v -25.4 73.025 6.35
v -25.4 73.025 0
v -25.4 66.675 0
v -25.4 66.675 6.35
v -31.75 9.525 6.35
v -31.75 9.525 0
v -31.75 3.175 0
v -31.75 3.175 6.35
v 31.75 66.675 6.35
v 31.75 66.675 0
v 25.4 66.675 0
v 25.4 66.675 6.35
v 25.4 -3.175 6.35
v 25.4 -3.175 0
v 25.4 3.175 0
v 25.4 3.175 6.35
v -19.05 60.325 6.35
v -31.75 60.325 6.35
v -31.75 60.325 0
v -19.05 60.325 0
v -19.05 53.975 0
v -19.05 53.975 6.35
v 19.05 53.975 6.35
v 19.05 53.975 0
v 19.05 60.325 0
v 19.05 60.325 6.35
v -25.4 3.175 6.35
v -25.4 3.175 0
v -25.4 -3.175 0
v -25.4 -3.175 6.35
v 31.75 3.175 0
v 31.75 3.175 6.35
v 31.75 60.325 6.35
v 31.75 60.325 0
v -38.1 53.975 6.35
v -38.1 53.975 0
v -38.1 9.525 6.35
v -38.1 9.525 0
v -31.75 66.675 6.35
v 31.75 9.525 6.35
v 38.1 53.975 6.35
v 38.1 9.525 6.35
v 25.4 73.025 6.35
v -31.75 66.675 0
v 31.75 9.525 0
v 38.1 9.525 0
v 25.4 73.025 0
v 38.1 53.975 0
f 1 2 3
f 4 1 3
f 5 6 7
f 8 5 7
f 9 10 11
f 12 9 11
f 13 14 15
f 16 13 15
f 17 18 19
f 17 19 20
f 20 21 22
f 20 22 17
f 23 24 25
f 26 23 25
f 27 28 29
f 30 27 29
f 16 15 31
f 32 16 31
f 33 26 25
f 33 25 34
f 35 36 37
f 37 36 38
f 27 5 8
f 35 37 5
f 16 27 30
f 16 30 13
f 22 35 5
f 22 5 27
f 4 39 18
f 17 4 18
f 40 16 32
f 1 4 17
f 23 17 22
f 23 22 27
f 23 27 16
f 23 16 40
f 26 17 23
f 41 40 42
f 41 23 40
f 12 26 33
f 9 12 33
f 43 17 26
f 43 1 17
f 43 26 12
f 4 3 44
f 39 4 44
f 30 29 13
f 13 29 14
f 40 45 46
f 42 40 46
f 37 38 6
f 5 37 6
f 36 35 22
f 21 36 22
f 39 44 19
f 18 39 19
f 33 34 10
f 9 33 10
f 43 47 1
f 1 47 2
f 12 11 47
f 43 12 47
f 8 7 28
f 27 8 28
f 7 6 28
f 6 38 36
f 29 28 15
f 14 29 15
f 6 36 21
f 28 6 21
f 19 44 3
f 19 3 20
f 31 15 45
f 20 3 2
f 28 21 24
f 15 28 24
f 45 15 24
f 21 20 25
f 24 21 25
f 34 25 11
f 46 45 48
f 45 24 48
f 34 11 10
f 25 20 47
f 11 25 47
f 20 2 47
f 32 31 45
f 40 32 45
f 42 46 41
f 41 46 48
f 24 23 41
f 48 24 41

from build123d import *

# Parameters (mm, degrees)
BOSS_EXTRUDE1_DEPTH = 6.35
SKETCH3_W           = 19.05
SKETCH3_H           = 6.35
CUT_EXTRUDE1_DEPTH  = 83.611035128


with BuildPart() as part:
    # Sketch1 → Boss-Extrude1 (new body)
    with BuildSketch(Plane.XY):
        Polygon((-25.4, -3.175), (25.4, -3.175), (25.4, 3.175), (31.75, 3.175), (31.75, 9.525), (38.1, 9.525), (38.1, 60.325), (31.75, 60.325), (31.75, 66.675), (25.4, 66.675), (25.4, 73.025), (-25.4, 73.025), (-25.4, 66.675), (-31.75, 66.675), (-31.75, 60.325), (-38.1, 60.325), (-38.1, 9.525), (-31.75, 9.525), (-31.75, 3.175), (-25.4, 3.175), align=None)
    extrude(amount=BOSS_EXTRUDE1_DEPTH)

    # Sketch3 → Cut-Extrude1 (cut, through all)
    with BuildSketch(Plane.XY.offset(6.35)):
        with Locations((28.575, 57.15)):
            Rectangle(SKETCH3_W, SKETCH3_H)
        with Locations((-28.575, 57.15)):
            Rectangle(SKETCH3_W, SKETCH3_H)
    extrude(amount=-CUT_EXTRUDE1_DEPTH, mode=Mode.SUBTRACT)


solid = part.part
